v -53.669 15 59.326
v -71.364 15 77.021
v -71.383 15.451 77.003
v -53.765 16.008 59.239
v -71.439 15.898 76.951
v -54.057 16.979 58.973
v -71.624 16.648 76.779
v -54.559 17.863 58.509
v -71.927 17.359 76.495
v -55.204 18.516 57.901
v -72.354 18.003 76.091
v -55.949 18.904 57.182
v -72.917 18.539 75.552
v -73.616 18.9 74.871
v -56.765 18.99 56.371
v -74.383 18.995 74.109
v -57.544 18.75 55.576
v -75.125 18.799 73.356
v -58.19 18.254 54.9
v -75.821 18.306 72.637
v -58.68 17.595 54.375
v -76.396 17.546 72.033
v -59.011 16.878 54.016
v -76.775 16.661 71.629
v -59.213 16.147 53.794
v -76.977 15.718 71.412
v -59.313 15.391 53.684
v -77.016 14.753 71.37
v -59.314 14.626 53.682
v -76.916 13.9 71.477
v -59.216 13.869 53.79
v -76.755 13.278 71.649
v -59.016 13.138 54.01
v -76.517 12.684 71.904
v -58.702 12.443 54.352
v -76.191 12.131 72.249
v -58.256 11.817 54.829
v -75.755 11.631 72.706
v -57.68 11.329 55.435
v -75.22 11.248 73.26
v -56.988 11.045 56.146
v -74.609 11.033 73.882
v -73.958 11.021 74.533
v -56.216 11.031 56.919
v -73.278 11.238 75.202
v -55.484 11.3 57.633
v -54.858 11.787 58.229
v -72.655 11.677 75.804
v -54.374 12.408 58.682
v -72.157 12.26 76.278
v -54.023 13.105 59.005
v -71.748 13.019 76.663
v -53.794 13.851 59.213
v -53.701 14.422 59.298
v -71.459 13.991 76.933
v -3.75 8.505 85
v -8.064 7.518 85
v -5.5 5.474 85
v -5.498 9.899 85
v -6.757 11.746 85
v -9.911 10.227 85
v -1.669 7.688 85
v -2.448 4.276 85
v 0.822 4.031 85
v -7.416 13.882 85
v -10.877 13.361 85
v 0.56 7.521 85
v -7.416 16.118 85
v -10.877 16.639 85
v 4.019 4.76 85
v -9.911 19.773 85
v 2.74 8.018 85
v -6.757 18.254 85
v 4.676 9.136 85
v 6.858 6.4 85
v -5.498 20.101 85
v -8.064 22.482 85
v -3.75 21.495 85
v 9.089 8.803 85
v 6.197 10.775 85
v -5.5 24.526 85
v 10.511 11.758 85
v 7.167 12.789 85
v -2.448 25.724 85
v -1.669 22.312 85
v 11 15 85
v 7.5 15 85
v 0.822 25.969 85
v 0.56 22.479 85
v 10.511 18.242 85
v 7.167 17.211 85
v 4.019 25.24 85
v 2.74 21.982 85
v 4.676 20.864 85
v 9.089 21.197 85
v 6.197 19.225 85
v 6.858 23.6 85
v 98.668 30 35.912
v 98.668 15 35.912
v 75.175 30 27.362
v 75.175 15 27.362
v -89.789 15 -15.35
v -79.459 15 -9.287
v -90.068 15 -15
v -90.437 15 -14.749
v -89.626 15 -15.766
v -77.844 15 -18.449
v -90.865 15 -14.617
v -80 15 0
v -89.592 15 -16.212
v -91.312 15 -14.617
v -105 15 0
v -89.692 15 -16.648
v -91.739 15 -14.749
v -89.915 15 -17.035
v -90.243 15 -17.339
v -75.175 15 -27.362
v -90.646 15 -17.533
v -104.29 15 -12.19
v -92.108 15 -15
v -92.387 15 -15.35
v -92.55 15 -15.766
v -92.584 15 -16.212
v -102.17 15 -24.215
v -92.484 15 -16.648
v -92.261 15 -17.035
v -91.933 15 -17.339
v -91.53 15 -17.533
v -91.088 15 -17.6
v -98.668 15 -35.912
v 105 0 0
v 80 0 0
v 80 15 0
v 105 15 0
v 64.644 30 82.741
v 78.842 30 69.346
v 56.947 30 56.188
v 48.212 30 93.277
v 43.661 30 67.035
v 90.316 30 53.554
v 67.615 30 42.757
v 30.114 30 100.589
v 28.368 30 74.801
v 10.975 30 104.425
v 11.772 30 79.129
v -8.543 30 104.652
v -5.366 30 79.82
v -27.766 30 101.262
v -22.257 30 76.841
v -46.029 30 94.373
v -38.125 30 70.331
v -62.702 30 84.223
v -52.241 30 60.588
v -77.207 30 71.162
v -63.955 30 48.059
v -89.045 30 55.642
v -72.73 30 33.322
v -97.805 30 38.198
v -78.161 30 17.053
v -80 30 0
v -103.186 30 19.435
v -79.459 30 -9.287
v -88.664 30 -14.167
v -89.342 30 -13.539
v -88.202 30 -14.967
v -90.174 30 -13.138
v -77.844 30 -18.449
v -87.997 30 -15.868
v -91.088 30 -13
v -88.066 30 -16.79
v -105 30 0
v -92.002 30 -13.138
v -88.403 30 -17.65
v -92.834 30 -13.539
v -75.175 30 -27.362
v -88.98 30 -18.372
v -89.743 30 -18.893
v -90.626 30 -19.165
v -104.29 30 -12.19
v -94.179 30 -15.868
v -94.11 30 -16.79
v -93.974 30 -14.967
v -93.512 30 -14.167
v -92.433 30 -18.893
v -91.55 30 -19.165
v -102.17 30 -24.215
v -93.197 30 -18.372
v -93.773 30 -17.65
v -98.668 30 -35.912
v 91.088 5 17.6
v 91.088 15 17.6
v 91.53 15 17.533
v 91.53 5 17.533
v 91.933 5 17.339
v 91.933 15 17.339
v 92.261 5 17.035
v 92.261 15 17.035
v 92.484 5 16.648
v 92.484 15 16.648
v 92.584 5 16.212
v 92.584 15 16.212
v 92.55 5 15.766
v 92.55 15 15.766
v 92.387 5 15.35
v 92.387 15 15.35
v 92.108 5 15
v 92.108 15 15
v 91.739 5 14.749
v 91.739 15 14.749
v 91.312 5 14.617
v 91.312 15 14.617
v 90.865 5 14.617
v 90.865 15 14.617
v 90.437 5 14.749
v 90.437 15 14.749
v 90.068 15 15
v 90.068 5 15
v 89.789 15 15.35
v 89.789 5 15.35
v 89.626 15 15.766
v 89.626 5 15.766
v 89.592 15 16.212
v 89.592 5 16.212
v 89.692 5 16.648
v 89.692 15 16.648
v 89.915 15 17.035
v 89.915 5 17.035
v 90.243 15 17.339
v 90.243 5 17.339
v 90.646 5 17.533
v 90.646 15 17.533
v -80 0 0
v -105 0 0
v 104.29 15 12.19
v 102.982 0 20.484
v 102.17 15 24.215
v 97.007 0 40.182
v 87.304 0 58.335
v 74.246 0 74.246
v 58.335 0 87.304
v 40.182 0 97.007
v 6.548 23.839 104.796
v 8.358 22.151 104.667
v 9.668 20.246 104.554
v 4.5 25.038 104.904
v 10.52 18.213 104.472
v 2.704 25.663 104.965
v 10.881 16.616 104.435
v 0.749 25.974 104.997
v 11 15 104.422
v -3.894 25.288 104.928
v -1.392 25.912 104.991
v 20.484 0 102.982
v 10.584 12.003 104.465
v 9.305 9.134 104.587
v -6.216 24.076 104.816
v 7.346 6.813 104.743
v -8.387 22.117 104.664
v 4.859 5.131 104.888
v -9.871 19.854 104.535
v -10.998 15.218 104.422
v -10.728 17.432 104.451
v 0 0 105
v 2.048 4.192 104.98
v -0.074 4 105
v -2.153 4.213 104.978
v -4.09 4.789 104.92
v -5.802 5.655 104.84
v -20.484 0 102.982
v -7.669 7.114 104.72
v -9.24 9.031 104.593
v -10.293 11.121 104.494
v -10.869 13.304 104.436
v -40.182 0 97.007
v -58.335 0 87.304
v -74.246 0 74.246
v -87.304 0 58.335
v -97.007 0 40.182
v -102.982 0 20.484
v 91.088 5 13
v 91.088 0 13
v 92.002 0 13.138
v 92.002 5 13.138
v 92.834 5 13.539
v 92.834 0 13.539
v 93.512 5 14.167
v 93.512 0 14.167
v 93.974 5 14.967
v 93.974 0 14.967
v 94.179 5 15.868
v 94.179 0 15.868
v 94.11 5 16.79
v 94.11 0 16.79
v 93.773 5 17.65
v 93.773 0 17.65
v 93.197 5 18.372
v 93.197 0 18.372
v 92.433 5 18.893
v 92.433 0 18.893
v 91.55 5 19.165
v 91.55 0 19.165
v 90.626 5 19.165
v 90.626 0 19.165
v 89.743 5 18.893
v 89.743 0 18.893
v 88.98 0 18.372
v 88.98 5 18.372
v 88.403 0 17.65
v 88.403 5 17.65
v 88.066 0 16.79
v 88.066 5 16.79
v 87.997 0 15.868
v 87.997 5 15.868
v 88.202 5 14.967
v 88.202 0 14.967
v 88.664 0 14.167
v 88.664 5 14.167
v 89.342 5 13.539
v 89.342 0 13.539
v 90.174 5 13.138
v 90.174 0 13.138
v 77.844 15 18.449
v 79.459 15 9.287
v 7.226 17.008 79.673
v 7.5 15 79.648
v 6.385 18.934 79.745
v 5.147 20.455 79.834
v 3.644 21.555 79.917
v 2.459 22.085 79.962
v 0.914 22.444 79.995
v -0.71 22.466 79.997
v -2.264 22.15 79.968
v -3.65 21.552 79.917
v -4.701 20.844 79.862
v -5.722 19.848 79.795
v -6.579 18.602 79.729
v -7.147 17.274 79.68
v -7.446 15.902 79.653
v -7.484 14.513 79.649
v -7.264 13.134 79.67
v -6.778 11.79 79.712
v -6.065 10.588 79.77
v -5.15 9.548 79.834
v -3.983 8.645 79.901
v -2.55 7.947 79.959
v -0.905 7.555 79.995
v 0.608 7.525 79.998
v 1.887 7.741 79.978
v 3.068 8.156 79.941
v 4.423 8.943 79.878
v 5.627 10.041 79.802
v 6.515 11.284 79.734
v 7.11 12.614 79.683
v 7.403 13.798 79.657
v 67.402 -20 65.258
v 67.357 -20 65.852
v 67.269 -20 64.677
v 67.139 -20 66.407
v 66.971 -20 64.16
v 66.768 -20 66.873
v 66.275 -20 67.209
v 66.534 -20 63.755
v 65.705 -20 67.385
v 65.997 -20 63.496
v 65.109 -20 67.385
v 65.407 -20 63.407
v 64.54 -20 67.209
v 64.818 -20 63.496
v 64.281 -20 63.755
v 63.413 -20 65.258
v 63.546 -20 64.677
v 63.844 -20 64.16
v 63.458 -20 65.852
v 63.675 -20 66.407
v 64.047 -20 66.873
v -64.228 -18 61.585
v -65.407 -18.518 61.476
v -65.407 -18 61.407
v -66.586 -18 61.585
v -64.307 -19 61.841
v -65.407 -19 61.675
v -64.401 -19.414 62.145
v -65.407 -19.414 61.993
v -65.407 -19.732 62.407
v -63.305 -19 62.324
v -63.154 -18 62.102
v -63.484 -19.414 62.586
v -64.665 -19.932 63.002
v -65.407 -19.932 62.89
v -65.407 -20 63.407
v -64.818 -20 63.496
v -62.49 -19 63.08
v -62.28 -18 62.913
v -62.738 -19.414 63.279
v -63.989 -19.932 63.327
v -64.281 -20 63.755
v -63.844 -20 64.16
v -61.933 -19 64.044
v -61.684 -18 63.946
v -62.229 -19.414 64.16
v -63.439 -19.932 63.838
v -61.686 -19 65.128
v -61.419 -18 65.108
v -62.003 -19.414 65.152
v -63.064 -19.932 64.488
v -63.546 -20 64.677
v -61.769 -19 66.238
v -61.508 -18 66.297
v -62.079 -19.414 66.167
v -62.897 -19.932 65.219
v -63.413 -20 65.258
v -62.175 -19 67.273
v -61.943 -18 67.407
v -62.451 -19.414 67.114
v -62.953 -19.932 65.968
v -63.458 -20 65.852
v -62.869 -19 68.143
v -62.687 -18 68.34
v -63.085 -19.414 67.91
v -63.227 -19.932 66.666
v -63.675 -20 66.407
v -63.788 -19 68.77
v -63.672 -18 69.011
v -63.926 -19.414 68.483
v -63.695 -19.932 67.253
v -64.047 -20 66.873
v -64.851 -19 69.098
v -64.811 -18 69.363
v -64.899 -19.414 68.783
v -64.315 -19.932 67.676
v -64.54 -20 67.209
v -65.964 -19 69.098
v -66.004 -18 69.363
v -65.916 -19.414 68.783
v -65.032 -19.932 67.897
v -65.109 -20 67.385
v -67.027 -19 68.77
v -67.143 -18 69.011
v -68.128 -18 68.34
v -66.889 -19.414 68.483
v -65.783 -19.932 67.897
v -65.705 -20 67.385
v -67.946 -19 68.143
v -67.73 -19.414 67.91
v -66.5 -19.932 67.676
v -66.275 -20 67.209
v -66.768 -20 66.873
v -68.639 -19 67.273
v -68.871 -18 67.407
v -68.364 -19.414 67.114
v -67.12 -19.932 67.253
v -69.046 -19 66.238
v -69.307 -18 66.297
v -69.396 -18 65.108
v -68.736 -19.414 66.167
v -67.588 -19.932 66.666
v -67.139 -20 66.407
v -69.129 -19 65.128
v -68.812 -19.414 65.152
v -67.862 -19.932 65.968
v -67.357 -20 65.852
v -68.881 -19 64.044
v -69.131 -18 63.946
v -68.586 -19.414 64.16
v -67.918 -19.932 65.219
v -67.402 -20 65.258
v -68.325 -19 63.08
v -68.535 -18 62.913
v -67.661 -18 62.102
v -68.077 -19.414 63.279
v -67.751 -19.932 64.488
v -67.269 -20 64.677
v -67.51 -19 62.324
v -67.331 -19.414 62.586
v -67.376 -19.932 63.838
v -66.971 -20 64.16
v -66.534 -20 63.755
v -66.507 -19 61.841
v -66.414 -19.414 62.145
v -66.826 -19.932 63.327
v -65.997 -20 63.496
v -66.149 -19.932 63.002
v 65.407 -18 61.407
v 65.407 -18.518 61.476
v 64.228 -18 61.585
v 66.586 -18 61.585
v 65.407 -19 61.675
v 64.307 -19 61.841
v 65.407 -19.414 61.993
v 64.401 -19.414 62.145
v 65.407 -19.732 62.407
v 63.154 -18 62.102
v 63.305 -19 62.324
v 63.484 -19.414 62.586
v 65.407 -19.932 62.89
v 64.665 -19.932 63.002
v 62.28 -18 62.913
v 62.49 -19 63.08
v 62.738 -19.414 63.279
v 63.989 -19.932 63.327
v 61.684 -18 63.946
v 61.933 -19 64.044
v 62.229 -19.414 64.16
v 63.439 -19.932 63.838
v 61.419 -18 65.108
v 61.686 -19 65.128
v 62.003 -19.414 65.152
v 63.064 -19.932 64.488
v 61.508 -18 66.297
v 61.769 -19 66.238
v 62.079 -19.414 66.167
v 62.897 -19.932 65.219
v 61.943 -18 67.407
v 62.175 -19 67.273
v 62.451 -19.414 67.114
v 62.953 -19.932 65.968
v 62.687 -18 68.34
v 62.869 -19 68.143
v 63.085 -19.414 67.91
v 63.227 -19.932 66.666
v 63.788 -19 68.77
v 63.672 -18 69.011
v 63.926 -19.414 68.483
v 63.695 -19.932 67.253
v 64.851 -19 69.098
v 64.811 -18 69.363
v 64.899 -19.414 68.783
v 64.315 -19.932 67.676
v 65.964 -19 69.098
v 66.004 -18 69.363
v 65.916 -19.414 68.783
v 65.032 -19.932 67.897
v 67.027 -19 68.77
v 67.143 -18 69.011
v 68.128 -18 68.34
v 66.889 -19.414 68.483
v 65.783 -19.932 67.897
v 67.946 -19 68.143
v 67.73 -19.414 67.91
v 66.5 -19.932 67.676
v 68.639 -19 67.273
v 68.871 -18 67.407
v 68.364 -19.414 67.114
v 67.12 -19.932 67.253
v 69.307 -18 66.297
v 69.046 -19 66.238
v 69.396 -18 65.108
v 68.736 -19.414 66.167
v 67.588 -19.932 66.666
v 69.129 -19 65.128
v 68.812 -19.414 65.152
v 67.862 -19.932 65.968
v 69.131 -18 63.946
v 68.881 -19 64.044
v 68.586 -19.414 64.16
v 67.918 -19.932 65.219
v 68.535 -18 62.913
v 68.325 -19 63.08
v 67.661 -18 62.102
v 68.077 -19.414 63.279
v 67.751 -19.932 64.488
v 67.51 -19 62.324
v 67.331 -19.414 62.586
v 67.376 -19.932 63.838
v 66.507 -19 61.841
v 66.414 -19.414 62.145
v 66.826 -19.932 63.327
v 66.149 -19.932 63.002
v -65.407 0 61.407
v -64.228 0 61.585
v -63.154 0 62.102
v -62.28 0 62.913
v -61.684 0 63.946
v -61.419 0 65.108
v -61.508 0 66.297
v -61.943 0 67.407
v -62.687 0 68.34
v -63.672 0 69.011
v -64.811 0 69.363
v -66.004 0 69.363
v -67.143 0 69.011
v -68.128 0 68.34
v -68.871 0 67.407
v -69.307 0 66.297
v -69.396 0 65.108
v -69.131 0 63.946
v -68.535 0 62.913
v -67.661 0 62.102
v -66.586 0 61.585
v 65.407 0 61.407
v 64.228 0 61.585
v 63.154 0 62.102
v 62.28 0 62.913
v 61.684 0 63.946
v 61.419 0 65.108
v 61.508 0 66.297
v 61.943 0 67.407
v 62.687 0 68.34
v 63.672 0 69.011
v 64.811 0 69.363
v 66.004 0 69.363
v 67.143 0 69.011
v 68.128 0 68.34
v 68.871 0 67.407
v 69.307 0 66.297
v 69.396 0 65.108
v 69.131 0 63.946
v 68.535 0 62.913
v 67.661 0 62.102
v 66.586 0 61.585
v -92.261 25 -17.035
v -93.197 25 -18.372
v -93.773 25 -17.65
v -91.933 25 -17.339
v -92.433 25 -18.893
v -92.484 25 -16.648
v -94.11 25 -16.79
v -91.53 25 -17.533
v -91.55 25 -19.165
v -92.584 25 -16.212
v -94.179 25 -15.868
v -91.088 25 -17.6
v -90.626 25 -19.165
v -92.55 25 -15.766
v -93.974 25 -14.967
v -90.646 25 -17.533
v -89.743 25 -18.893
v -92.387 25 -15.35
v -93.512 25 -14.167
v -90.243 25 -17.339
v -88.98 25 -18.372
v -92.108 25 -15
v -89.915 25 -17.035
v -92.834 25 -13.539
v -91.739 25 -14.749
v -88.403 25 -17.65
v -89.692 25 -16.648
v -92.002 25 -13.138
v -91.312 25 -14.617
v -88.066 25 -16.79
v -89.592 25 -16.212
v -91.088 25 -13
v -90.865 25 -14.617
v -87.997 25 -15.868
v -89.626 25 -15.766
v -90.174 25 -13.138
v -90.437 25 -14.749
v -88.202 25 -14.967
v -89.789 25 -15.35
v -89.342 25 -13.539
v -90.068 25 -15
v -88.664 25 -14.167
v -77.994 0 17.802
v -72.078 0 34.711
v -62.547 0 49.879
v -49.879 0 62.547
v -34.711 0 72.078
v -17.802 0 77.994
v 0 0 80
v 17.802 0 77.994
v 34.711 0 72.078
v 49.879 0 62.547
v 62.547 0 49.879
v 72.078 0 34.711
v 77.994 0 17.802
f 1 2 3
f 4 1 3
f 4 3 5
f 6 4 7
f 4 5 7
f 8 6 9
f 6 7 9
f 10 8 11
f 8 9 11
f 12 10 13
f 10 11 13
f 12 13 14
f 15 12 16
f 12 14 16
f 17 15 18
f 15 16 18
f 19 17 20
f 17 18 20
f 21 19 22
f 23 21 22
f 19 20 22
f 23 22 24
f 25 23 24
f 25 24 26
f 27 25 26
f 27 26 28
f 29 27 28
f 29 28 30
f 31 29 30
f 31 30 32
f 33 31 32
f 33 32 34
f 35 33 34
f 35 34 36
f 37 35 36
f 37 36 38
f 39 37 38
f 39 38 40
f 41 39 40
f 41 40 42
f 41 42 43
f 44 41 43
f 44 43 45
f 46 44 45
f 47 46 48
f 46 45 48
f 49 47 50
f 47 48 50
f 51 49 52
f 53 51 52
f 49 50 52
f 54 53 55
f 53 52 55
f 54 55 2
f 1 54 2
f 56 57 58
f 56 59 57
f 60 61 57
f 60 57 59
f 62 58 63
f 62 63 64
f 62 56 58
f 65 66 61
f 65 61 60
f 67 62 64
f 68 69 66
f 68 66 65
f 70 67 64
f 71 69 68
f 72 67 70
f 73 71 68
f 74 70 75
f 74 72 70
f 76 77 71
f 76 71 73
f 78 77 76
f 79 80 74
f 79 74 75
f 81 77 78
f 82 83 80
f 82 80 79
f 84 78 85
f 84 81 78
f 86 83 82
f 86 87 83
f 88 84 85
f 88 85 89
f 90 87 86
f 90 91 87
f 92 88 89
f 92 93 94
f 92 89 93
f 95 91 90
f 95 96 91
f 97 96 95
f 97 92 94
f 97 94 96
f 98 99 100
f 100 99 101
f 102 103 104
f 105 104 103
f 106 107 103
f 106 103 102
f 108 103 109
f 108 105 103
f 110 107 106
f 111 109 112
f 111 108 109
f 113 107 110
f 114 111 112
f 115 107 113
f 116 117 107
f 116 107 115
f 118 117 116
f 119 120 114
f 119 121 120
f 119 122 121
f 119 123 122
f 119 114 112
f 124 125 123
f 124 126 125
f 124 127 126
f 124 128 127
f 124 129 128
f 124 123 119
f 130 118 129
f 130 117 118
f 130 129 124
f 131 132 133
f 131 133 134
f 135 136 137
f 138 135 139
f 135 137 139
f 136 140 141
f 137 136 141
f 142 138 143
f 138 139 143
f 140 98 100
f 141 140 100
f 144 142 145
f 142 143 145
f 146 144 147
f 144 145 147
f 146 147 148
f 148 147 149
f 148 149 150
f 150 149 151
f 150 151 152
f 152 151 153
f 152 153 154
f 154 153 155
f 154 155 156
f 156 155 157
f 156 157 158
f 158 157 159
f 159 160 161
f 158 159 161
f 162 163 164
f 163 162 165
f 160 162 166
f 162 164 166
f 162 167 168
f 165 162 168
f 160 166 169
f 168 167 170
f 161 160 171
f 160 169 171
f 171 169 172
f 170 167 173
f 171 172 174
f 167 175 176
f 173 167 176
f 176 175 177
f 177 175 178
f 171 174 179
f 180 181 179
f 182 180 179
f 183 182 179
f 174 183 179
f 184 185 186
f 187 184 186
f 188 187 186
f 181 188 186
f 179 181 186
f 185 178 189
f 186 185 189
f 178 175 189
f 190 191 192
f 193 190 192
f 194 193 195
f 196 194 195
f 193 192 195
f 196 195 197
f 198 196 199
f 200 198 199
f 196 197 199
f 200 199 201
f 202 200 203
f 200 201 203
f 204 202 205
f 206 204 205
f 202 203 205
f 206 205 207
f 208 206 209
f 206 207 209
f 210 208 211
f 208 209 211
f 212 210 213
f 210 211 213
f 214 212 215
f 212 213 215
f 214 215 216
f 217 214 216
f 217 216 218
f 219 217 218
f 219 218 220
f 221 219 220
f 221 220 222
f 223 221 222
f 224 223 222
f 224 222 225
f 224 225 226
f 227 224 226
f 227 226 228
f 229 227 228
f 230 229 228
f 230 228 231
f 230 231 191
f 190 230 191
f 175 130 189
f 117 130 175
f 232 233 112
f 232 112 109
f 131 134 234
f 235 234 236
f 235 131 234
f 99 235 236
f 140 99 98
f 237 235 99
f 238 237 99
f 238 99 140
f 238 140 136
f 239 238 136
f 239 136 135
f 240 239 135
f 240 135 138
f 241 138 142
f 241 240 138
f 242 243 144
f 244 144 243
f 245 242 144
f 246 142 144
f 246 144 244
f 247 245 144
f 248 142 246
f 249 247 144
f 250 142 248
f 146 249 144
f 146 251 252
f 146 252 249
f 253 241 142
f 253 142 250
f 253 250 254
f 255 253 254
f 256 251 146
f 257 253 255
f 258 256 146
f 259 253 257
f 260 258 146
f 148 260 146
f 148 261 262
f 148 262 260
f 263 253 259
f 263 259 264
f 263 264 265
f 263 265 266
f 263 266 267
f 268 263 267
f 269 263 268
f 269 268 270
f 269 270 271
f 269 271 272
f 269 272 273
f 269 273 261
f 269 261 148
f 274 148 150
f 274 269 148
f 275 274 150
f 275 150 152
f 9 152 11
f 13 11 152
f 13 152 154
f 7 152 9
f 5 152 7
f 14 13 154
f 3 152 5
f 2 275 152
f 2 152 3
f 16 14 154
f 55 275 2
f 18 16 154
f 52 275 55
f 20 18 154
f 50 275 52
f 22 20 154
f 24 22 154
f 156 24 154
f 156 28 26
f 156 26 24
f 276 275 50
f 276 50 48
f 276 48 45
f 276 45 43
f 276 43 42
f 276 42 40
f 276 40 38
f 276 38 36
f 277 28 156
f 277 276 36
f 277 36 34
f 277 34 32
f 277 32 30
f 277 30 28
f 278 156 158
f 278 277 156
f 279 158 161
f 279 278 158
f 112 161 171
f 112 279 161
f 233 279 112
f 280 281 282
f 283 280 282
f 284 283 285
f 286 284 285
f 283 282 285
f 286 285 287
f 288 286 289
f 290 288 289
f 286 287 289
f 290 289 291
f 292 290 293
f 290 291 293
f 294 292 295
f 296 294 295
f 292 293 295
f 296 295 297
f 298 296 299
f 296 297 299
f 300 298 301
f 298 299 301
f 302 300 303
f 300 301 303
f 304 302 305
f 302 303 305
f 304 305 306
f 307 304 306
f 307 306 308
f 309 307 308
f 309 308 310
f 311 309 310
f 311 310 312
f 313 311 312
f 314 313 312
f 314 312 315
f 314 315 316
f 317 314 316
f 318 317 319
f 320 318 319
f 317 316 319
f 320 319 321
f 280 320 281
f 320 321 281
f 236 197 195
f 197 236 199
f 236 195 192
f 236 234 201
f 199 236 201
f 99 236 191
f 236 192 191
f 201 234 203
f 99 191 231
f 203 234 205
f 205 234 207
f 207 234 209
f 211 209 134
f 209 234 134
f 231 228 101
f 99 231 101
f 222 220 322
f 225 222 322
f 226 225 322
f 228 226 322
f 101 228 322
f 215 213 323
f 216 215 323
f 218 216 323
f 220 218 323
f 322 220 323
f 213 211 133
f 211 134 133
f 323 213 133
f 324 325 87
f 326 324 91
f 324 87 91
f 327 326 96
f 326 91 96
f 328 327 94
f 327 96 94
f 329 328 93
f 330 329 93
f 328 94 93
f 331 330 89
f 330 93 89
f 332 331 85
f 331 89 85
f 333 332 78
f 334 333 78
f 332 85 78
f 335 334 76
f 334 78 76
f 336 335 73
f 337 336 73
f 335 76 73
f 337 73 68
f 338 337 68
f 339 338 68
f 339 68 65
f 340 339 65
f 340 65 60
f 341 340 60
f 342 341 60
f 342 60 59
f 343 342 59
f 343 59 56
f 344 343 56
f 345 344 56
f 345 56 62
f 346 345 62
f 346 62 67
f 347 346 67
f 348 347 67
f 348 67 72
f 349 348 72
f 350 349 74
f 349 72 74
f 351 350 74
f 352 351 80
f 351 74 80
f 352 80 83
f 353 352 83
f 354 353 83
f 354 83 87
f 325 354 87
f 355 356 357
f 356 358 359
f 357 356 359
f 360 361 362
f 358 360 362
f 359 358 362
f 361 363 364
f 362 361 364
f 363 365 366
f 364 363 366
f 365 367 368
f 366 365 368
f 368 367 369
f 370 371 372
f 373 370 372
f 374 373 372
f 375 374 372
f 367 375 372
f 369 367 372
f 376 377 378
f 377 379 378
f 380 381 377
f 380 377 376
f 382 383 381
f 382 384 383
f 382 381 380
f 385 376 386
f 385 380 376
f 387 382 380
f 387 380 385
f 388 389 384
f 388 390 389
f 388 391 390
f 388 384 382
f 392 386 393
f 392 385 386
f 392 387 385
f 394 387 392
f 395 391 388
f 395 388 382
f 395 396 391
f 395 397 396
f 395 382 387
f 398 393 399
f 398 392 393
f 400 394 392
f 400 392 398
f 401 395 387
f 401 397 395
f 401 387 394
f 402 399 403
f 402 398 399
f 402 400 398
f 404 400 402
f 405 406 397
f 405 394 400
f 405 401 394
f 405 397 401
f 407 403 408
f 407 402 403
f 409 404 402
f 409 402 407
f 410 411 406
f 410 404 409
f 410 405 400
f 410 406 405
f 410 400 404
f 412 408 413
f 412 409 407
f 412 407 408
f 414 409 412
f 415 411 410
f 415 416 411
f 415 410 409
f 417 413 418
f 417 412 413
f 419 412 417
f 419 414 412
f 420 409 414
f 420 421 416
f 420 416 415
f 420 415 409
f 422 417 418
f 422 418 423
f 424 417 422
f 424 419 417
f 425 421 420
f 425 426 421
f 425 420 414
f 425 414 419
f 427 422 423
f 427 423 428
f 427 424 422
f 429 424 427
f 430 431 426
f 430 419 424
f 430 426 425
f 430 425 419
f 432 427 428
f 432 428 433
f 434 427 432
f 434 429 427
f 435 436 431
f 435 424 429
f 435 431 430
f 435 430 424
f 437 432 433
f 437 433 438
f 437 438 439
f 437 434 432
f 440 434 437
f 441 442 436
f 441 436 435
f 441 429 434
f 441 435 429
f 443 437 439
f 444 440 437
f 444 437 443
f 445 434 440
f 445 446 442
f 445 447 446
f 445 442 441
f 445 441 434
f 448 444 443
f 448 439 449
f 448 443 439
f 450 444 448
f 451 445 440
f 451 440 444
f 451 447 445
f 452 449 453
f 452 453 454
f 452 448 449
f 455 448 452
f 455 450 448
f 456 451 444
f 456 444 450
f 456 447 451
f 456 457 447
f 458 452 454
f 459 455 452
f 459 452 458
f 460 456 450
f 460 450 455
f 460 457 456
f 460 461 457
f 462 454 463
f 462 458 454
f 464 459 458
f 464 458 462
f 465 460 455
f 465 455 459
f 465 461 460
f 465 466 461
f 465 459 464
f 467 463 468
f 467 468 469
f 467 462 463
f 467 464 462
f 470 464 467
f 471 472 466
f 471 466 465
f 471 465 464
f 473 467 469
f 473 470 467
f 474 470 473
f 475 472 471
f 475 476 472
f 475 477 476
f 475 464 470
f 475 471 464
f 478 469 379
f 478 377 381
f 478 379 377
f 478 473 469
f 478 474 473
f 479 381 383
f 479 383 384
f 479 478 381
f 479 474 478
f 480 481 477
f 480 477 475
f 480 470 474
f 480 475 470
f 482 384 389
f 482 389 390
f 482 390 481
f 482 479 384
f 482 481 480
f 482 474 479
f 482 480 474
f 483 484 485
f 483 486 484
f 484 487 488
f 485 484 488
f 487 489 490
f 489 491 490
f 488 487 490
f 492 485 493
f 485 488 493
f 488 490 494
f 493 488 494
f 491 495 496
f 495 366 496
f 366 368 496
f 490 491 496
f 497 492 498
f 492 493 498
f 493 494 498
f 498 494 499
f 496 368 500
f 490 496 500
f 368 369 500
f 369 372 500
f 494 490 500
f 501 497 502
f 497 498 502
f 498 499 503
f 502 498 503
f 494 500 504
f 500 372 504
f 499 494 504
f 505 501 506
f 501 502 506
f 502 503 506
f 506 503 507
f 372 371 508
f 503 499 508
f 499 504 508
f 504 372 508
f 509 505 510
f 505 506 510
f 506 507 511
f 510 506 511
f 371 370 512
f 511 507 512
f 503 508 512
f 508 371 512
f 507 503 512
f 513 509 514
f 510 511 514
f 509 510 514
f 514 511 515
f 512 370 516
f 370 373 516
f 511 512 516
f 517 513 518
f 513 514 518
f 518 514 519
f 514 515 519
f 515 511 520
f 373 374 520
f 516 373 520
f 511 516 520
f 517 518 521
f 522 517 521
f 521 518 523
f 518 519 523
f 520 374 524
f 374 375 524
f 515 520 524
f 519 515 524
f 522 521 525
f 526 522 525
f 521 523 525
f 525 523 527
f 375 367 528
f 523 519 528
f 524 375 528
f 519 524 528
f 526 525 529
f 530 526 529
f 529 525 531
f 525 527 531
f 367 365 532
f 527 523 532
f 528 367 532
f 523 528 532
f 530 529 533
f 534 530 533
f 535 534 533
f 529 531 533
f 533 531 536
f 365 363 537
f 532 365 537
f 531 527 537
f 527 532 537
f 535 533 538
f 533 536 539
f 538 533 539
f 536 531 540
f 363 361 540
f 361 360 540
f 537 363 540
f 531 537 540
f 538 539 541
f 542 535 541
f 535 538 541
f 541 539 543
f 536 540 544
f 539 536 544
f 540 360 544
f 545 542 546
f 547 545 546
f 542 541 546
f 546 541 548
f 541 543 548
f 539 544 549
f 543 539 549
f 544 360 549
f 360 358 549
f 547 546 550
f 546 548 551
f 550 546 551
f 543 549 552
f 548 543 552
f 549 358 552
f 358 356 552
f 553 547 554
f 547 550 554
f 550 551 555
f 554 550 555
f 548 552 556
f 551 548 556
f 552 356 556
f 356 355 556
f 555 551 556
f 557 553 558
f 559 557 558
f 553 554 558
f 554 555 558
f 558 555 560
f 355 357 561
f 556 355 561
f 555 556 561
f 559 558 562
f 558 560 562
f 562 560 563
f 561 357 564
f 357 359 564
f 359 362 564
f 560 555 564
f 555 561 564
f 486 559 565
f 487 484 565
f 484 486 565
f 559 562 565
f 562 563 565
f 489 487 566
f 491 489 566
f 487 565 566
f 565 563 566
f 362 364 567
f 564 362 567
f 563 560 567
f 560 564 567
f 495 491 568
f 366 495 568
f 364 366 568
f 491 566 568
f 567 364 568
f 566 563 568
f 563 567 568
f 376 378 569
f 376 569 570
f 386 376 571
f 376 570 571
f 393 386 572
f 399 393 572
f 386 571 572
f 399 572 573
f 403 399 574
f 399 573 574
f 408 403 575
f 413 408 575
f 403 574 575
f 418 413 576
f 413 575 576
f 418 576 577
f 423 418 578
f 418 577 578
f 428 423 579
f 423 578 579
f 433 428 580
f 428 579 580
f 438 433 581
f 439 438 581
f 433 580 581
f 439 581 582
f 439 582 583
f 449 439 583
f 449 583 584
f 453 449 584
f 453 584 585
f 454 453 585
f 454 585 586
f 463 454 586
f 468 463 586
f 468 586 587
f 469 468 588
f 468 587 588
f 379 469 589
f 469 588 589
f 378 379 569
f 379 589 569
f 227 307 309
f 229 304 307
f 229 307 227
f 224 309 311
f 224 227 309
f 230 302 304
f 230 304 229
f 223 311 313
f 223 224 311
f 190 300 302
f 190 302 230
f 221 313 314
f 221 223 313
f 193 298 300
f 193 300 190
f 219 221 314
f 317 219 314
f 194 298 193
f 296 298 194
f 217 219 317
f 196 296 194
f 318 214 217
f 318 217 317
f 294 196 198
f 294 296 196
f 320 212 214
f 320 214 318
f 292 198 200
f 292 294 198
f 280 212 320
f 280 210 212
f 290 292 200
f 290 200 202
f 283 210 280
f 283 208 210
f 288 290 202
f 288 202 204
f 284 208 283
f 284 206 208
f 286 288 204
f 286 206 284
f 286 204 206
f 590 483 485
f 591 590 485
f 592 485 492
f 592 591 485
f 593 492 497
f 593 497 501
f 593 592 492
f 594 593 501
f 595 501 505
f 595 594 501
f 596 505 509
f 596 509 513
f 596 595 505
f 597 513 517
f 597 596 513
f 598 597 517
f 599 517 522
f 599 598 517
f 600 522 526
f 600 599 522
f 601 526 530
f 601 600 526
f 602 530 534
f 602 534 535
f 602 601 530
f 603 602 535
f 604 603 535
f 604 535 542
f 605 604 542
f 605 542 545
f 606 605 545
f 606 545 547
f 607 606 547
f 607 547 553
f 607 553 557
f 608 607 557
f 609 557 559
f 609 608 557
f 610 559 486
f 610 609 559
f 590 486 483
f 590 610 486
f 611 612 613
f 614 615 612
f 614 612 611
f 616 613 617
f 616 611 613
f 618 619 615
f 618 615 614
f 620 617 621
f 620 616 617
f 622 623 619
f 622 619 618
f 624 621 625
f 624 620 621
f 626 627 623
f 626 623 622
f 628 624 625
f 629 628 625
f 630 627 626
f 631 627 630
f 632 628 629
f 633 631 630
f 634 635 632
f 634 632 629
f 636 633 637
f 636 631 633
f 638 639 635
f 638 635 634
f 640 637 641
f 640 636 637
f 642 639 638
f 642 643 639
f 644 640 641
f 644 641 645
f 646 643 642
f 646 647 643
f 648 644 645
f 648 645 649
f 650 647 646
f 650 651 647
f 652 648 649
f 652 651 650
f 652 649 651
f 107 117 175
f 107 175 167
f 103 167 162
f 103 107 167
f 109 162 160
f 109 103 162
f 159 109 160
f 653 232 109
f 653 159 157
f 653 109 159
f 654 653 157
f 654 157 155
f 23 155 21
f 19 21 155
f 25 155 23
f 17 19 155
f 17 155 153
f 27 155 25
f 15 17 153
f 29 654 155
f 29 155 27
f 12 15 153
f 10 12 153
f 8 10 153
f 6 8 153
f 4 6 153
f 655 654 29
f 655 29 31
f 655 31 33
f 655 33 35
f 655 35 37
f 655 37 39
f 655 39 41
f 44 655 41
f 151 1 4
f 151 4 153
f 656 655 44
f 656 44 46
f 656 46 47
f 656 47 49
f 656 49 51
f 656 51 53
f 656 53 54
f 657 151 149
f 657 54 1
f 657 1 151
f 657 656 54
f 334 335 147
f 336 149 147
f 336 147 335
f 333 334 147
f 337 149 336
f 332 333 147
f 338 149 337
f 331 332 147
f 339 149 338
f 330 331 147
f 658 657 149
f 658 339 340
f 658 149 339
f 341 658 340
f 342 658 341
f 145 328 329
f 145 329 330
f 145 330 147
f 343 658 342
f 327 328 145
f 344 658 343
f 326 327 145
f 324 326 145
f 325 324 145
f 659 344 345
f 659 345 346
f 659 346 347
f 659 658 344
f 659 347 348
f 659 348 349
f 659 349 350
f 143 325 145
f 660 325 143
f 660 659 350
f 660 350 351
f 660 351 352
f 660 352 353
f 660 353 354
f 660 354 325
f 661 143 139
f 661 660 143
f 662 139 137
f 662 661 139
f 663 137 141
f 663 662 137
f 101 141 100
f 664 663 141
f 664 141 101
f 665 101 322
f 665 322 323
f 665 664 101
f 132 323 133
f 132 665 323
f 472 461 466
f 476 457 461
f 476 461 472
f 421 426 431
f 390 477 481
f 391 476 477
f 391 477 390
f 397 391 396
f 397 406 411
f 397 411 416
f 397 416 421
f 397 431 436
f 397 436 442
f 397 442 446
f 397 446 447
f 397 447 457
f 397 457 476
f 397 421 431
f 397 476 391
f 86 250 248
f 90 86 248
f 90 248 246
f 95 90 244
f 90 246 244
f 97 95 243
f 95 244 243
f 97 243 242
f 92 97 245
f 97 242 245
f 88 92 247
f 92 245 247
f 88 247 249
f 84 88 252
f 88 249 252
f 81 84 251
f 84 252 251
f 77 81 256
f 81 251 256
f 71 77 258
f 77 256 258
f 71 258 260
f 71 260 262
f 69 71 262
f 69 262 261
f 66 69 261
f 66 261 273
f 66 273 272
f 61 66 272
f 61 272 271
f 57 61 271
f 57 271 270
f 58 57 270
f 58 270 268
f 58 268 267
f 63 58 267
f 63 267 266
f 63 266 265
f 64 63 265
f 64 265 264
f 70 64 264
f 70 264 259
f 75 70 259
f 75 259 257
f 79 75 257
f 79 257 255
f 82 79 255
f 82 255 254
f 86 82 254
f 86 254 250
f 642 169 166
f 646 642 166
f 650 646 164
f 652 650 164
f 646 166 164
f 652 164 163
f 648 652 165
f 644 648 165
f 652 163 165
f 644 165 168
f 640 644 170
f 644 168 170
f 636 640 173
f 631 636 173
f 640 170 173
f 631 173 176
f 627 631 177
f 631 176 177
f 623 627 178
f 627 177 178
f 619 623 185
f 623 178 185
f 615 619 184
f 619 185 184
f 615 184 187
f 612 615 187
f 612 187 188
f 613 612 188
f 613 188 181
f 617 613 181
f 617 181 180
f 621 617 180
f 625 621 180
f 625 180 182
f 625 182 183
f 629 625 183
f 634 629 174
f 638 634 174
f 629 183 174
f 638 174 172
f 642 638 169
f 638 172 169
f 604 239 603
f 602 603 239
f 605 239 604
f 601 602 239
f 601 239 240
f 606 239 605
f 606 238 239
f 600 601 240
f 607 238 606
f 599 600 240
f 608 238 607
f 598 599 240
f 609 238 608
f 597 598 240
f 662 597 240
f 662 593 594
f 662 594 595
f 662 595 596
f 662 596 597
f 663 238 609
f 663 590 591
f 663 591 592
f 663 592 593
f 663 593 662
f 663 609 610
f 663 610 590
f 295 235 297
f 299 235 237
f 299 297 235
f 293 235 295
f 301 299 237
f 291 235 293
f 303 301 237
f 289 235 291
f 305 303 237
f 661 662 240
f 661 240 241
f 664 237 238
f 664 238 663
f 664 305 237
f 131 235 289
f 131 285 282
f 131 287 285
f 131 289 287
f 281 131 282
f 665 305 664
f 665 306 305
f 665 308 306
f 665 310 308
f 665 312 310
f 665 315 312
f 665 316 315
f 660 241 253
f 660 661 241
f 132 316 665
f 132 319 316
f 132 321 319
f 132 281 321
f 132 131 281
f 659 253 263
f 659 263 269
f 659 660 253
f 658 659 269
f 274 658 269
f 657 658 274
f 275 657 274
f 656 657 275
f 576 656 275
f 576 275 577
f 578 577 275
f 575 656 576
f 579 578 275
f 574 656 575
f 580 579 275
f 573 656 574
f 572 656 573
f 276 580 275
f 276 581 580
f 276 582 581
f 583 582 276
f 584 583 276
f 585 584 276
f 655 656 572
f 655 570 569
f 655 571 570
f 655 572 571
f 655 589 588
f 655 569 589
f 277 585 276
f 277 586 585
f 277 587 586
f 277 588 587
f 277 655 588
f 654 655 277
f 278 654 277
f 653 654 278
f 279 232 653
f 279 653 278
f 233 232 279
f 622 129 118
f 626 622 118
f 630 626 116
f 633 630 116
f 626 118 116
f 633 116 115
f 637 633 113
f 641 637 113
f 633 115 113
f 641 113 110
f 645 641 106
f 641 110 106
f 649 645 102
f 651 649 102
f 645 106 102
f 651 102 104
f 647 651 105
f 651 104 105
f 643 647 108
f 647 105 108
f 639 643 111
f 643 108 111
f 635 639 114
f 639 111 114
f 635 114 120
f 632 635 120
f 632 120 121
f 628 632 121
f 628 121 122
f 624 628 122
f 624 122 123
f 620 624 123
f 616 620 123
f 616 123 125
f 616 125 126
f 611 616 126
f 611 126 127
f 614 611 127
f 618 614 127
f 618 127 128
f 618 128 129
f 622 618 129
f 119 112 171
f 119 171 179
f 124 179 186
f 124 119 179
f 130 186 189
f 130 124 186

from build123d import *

# Parameters (mm, degrees)
BOSS_EXTRUDE1_DEPTH  = 30
BOSS_EXTRUDE2_START  = -15
BOSS_EXTRUDE2_DEPTH  = 15
CUT_EXTRUDE1_START   = -15
CUT_EXTRUDE1_DEPTH   = 15
SKETCH5_R            = 1.5
CUT_EXTRUDE2_DEPTH   = 15
SKETCH6_R            = 3.1
CUT_EXTRUDE3_DEPTH   = 5
SKETCH7_R            = 1.5
CUT_EXTRUDE4_DEPTH   = 15
SKETCH8_R            = 3.1
CUT_EXTRUDE5_DEPTH   = 5
SKETCH11_R           = 7.5
CUT_EXTRUDE6_DEPTH   = 30
SKETCH12_R           = 11
CUT_EXTRUDE7_DEPTH   = 20
SKETCH13_R           = 4
BOSS_EXTRUDE3_DEPTH  = 20
FILLET1_R            = 2
FILLET1_OF_MIRROR1_R = 2
SKETCH14_R           = 4
CUT_EXTRUDE8_DEPTH   = 40


with BuildPart() as part:
    # Sketch2 → Boss-Extrude1 (new body)
    with BuildSketch(Plane(origin=(0, 0, 0), x_dir=(1, 0, 0), z_dir=(0, 1, 0))):
        with BuildLine():
            Line((-105, 0), (-80, 0))
            ThreePointArc((-80, 0), (0, -80), (80, 0))
            Line((80, 0), (105, 0))
            ThreePointArc((105, 0), (0, -105), (-105, 0))
        make_face()
    extrude(amount=BOSS_EXTRUDE1_DEPTH)

    # Sketch3 → Boss-Extrude2 (add)
    with BuildSketch(Plane(origin=(0, 30, 0), x_dir=(1, 0, 0), z_dir=(0, 1, 0)).offset(BOSS_EXTRUDE2_START)):
        with BuildLine():
            Line((-98.667725183, 35.912115049), (-75.175409663, 27.361611466))
            ThreePointArc((-75.175409663, 27.361611466), (-78.784620241, 13.891854213), (-80, 0))
            Line((-80, 0), (-105, 0))
            ThreePointArc((-105, 0), (-103.404814066, 18.233058655), (-98.667725183, 35.912115049))
        make_face()
    extrude(amount=BOSS_EXTRUDE2_DEPTH)

    # Sketch4 → Cut-Extrude1 (cut)
    with BuildSketch(Plane(origin=(0, 30, 0), x_dir=(1, 0, 0), z_dir=(0, 1, 0)).offset(CUT_EXTRUDE1_START)):
        with BuildLine():
            Line((80, 0), (105, 0))
            ThreePointArc((105, 0), (103.404814066, -18.233058655), (98.667725183, -35.912115049))
            Line((98.667725183, -35.912115049), (75.175409663, -27.361611466))
            ThreePointArc((75.175409663, -27.361611466), (78.784620241, -13.891854213), (80, 0))
        make_face()
    extrude(amount=CUT_EXTRUDE1_DEPTH, mode=Mode.SUBTRACT)

    # Sketch5 → Cut-Extrude2 (cut)
    with BuildSketch(Plane(origin=(0, 15, 0), x_dir=(1, 0, 0), z_dir=(0, 1, 0))):
        with Locations(Location((91.088089232, -16.1, 0), (0, 0, 270))):
            Circle(SKETCH5_R)
    extrude(amount=-CUT_EXTRUDE2_DEPTH, mode=Mode.SUBTRACT)

    # Sketch6 → Cut-Extrude3 (cut)
    with BuildSketch(Plane(origin=(0, 0, 0), x_dir=(-1, 0, 0), z_dir=(0, -1, 0))):
        with Locations(Location((-91.088089232, -16.1, 0), (0, 0, 90))):
            Circle(SKETCH6_R)
    extrude(amount=-CUT_EXTRUDE3_DEPTH, mode=Mode.SUBTRACT)

    # Sketch7 → Cut-Extrude4 (cut)
    with BuildSketch(Plane.XZ.offset(-15)):
        with Locations(Location((-91.088089232, -16.1, 0), (0, 0, 270))):
            Circle(SKETCH7_R)
    extrude(amount=-CUT_EXTRUDE4_DEPTH, mode=Mode.SUBTRACT)

    # Sketch8 → Cut-Extrude5 (cut)
    with BuildSketch(Plane(origin=(0, 30, 0), x_dir=(1, 0, 0), z_dir=(0, 1, 0))):
        with Locations(Location((-91.088089232, 16.1, 0), (0, 0, 270))):
            Circle(SKETCH8_R)
    extrude(amount=-CUT_EXTRUDE5_DEPTH, mode=Mode.SUBTRACT)

    # Sketch11 → Cut-Extrude6 (cut)
    with BuildSketch(Plane.XY.offset(105)):
        with Locations((0, 15)):
            Circle(SKETCH11_R)
    extrude(amount=-CUT_EXTRUDE6_DEPTH, mode=Mode.SUBTRACT)

    # Sketch12 → Cut-Extrude7 (cut)
    with BuildSketch(Plane.XY.offset(105)):
        with Locations((0, 15)):
            Circle(SKETCH12_R)
    extrude(amount=-CUT_EXTRUDE7_DEPTH, mode=Mode.SUBTRACT)

    # Sketch13 → Boss-Extrude3 (add)
    with BuildSketch(Plane.XZ):
        with Locations(Location((-65.40737726, 65.40737726, 0), (0, 0, 270))):
            Circle(SKETCH13_R)
    boss_extrude3 = extrude(amount=BOSS_EXTRUDE3_DEPTH)

    # Fillet1
    fillet1_edges = [part.edges().sort_by_distance(p)[0] for p in [
        (-65.40737726, -20, 69.40737726),
    ]]
    fillet(fillet1_edges, radius=FILLET1_R)

    # Mirror1: Boss-Extrude3 across plane
    add(boss_extrude3.mirror(Plane(origin=(0, 0, 0), x_dir=(0, 0, 1), z_dir=(1, 0, 0))))

    # Fillet1 of Mirror1
    fillet1_of_mirror1_edges = [part.edges().sort_by_distance(p)[0] for p in [
        (65.40737726, -20, 69.40737726),
    ]]
    fillet(fillet1_of_mirror1_edges, radius=FILLET1_OF_MIRROR1_R)

    # Sketch14 → Cut-Extrude8 (cut)
    with BuildSketch(Plane(origin=(-74.246212025, 0, 74.246212025), x_dir=(0, -1, 0), z_dir=(-0.7071067811865488, 0, 0.7071067811865464))):
        with Locations(Location((-15, 0, 0), (0, 0, 90))):
            Circle(SKETCH14_R)
    extrude(amount=-CUT_EXTRUDE8_DEPTH, mode=Mode.SUBTRACT)


solid = part.part
